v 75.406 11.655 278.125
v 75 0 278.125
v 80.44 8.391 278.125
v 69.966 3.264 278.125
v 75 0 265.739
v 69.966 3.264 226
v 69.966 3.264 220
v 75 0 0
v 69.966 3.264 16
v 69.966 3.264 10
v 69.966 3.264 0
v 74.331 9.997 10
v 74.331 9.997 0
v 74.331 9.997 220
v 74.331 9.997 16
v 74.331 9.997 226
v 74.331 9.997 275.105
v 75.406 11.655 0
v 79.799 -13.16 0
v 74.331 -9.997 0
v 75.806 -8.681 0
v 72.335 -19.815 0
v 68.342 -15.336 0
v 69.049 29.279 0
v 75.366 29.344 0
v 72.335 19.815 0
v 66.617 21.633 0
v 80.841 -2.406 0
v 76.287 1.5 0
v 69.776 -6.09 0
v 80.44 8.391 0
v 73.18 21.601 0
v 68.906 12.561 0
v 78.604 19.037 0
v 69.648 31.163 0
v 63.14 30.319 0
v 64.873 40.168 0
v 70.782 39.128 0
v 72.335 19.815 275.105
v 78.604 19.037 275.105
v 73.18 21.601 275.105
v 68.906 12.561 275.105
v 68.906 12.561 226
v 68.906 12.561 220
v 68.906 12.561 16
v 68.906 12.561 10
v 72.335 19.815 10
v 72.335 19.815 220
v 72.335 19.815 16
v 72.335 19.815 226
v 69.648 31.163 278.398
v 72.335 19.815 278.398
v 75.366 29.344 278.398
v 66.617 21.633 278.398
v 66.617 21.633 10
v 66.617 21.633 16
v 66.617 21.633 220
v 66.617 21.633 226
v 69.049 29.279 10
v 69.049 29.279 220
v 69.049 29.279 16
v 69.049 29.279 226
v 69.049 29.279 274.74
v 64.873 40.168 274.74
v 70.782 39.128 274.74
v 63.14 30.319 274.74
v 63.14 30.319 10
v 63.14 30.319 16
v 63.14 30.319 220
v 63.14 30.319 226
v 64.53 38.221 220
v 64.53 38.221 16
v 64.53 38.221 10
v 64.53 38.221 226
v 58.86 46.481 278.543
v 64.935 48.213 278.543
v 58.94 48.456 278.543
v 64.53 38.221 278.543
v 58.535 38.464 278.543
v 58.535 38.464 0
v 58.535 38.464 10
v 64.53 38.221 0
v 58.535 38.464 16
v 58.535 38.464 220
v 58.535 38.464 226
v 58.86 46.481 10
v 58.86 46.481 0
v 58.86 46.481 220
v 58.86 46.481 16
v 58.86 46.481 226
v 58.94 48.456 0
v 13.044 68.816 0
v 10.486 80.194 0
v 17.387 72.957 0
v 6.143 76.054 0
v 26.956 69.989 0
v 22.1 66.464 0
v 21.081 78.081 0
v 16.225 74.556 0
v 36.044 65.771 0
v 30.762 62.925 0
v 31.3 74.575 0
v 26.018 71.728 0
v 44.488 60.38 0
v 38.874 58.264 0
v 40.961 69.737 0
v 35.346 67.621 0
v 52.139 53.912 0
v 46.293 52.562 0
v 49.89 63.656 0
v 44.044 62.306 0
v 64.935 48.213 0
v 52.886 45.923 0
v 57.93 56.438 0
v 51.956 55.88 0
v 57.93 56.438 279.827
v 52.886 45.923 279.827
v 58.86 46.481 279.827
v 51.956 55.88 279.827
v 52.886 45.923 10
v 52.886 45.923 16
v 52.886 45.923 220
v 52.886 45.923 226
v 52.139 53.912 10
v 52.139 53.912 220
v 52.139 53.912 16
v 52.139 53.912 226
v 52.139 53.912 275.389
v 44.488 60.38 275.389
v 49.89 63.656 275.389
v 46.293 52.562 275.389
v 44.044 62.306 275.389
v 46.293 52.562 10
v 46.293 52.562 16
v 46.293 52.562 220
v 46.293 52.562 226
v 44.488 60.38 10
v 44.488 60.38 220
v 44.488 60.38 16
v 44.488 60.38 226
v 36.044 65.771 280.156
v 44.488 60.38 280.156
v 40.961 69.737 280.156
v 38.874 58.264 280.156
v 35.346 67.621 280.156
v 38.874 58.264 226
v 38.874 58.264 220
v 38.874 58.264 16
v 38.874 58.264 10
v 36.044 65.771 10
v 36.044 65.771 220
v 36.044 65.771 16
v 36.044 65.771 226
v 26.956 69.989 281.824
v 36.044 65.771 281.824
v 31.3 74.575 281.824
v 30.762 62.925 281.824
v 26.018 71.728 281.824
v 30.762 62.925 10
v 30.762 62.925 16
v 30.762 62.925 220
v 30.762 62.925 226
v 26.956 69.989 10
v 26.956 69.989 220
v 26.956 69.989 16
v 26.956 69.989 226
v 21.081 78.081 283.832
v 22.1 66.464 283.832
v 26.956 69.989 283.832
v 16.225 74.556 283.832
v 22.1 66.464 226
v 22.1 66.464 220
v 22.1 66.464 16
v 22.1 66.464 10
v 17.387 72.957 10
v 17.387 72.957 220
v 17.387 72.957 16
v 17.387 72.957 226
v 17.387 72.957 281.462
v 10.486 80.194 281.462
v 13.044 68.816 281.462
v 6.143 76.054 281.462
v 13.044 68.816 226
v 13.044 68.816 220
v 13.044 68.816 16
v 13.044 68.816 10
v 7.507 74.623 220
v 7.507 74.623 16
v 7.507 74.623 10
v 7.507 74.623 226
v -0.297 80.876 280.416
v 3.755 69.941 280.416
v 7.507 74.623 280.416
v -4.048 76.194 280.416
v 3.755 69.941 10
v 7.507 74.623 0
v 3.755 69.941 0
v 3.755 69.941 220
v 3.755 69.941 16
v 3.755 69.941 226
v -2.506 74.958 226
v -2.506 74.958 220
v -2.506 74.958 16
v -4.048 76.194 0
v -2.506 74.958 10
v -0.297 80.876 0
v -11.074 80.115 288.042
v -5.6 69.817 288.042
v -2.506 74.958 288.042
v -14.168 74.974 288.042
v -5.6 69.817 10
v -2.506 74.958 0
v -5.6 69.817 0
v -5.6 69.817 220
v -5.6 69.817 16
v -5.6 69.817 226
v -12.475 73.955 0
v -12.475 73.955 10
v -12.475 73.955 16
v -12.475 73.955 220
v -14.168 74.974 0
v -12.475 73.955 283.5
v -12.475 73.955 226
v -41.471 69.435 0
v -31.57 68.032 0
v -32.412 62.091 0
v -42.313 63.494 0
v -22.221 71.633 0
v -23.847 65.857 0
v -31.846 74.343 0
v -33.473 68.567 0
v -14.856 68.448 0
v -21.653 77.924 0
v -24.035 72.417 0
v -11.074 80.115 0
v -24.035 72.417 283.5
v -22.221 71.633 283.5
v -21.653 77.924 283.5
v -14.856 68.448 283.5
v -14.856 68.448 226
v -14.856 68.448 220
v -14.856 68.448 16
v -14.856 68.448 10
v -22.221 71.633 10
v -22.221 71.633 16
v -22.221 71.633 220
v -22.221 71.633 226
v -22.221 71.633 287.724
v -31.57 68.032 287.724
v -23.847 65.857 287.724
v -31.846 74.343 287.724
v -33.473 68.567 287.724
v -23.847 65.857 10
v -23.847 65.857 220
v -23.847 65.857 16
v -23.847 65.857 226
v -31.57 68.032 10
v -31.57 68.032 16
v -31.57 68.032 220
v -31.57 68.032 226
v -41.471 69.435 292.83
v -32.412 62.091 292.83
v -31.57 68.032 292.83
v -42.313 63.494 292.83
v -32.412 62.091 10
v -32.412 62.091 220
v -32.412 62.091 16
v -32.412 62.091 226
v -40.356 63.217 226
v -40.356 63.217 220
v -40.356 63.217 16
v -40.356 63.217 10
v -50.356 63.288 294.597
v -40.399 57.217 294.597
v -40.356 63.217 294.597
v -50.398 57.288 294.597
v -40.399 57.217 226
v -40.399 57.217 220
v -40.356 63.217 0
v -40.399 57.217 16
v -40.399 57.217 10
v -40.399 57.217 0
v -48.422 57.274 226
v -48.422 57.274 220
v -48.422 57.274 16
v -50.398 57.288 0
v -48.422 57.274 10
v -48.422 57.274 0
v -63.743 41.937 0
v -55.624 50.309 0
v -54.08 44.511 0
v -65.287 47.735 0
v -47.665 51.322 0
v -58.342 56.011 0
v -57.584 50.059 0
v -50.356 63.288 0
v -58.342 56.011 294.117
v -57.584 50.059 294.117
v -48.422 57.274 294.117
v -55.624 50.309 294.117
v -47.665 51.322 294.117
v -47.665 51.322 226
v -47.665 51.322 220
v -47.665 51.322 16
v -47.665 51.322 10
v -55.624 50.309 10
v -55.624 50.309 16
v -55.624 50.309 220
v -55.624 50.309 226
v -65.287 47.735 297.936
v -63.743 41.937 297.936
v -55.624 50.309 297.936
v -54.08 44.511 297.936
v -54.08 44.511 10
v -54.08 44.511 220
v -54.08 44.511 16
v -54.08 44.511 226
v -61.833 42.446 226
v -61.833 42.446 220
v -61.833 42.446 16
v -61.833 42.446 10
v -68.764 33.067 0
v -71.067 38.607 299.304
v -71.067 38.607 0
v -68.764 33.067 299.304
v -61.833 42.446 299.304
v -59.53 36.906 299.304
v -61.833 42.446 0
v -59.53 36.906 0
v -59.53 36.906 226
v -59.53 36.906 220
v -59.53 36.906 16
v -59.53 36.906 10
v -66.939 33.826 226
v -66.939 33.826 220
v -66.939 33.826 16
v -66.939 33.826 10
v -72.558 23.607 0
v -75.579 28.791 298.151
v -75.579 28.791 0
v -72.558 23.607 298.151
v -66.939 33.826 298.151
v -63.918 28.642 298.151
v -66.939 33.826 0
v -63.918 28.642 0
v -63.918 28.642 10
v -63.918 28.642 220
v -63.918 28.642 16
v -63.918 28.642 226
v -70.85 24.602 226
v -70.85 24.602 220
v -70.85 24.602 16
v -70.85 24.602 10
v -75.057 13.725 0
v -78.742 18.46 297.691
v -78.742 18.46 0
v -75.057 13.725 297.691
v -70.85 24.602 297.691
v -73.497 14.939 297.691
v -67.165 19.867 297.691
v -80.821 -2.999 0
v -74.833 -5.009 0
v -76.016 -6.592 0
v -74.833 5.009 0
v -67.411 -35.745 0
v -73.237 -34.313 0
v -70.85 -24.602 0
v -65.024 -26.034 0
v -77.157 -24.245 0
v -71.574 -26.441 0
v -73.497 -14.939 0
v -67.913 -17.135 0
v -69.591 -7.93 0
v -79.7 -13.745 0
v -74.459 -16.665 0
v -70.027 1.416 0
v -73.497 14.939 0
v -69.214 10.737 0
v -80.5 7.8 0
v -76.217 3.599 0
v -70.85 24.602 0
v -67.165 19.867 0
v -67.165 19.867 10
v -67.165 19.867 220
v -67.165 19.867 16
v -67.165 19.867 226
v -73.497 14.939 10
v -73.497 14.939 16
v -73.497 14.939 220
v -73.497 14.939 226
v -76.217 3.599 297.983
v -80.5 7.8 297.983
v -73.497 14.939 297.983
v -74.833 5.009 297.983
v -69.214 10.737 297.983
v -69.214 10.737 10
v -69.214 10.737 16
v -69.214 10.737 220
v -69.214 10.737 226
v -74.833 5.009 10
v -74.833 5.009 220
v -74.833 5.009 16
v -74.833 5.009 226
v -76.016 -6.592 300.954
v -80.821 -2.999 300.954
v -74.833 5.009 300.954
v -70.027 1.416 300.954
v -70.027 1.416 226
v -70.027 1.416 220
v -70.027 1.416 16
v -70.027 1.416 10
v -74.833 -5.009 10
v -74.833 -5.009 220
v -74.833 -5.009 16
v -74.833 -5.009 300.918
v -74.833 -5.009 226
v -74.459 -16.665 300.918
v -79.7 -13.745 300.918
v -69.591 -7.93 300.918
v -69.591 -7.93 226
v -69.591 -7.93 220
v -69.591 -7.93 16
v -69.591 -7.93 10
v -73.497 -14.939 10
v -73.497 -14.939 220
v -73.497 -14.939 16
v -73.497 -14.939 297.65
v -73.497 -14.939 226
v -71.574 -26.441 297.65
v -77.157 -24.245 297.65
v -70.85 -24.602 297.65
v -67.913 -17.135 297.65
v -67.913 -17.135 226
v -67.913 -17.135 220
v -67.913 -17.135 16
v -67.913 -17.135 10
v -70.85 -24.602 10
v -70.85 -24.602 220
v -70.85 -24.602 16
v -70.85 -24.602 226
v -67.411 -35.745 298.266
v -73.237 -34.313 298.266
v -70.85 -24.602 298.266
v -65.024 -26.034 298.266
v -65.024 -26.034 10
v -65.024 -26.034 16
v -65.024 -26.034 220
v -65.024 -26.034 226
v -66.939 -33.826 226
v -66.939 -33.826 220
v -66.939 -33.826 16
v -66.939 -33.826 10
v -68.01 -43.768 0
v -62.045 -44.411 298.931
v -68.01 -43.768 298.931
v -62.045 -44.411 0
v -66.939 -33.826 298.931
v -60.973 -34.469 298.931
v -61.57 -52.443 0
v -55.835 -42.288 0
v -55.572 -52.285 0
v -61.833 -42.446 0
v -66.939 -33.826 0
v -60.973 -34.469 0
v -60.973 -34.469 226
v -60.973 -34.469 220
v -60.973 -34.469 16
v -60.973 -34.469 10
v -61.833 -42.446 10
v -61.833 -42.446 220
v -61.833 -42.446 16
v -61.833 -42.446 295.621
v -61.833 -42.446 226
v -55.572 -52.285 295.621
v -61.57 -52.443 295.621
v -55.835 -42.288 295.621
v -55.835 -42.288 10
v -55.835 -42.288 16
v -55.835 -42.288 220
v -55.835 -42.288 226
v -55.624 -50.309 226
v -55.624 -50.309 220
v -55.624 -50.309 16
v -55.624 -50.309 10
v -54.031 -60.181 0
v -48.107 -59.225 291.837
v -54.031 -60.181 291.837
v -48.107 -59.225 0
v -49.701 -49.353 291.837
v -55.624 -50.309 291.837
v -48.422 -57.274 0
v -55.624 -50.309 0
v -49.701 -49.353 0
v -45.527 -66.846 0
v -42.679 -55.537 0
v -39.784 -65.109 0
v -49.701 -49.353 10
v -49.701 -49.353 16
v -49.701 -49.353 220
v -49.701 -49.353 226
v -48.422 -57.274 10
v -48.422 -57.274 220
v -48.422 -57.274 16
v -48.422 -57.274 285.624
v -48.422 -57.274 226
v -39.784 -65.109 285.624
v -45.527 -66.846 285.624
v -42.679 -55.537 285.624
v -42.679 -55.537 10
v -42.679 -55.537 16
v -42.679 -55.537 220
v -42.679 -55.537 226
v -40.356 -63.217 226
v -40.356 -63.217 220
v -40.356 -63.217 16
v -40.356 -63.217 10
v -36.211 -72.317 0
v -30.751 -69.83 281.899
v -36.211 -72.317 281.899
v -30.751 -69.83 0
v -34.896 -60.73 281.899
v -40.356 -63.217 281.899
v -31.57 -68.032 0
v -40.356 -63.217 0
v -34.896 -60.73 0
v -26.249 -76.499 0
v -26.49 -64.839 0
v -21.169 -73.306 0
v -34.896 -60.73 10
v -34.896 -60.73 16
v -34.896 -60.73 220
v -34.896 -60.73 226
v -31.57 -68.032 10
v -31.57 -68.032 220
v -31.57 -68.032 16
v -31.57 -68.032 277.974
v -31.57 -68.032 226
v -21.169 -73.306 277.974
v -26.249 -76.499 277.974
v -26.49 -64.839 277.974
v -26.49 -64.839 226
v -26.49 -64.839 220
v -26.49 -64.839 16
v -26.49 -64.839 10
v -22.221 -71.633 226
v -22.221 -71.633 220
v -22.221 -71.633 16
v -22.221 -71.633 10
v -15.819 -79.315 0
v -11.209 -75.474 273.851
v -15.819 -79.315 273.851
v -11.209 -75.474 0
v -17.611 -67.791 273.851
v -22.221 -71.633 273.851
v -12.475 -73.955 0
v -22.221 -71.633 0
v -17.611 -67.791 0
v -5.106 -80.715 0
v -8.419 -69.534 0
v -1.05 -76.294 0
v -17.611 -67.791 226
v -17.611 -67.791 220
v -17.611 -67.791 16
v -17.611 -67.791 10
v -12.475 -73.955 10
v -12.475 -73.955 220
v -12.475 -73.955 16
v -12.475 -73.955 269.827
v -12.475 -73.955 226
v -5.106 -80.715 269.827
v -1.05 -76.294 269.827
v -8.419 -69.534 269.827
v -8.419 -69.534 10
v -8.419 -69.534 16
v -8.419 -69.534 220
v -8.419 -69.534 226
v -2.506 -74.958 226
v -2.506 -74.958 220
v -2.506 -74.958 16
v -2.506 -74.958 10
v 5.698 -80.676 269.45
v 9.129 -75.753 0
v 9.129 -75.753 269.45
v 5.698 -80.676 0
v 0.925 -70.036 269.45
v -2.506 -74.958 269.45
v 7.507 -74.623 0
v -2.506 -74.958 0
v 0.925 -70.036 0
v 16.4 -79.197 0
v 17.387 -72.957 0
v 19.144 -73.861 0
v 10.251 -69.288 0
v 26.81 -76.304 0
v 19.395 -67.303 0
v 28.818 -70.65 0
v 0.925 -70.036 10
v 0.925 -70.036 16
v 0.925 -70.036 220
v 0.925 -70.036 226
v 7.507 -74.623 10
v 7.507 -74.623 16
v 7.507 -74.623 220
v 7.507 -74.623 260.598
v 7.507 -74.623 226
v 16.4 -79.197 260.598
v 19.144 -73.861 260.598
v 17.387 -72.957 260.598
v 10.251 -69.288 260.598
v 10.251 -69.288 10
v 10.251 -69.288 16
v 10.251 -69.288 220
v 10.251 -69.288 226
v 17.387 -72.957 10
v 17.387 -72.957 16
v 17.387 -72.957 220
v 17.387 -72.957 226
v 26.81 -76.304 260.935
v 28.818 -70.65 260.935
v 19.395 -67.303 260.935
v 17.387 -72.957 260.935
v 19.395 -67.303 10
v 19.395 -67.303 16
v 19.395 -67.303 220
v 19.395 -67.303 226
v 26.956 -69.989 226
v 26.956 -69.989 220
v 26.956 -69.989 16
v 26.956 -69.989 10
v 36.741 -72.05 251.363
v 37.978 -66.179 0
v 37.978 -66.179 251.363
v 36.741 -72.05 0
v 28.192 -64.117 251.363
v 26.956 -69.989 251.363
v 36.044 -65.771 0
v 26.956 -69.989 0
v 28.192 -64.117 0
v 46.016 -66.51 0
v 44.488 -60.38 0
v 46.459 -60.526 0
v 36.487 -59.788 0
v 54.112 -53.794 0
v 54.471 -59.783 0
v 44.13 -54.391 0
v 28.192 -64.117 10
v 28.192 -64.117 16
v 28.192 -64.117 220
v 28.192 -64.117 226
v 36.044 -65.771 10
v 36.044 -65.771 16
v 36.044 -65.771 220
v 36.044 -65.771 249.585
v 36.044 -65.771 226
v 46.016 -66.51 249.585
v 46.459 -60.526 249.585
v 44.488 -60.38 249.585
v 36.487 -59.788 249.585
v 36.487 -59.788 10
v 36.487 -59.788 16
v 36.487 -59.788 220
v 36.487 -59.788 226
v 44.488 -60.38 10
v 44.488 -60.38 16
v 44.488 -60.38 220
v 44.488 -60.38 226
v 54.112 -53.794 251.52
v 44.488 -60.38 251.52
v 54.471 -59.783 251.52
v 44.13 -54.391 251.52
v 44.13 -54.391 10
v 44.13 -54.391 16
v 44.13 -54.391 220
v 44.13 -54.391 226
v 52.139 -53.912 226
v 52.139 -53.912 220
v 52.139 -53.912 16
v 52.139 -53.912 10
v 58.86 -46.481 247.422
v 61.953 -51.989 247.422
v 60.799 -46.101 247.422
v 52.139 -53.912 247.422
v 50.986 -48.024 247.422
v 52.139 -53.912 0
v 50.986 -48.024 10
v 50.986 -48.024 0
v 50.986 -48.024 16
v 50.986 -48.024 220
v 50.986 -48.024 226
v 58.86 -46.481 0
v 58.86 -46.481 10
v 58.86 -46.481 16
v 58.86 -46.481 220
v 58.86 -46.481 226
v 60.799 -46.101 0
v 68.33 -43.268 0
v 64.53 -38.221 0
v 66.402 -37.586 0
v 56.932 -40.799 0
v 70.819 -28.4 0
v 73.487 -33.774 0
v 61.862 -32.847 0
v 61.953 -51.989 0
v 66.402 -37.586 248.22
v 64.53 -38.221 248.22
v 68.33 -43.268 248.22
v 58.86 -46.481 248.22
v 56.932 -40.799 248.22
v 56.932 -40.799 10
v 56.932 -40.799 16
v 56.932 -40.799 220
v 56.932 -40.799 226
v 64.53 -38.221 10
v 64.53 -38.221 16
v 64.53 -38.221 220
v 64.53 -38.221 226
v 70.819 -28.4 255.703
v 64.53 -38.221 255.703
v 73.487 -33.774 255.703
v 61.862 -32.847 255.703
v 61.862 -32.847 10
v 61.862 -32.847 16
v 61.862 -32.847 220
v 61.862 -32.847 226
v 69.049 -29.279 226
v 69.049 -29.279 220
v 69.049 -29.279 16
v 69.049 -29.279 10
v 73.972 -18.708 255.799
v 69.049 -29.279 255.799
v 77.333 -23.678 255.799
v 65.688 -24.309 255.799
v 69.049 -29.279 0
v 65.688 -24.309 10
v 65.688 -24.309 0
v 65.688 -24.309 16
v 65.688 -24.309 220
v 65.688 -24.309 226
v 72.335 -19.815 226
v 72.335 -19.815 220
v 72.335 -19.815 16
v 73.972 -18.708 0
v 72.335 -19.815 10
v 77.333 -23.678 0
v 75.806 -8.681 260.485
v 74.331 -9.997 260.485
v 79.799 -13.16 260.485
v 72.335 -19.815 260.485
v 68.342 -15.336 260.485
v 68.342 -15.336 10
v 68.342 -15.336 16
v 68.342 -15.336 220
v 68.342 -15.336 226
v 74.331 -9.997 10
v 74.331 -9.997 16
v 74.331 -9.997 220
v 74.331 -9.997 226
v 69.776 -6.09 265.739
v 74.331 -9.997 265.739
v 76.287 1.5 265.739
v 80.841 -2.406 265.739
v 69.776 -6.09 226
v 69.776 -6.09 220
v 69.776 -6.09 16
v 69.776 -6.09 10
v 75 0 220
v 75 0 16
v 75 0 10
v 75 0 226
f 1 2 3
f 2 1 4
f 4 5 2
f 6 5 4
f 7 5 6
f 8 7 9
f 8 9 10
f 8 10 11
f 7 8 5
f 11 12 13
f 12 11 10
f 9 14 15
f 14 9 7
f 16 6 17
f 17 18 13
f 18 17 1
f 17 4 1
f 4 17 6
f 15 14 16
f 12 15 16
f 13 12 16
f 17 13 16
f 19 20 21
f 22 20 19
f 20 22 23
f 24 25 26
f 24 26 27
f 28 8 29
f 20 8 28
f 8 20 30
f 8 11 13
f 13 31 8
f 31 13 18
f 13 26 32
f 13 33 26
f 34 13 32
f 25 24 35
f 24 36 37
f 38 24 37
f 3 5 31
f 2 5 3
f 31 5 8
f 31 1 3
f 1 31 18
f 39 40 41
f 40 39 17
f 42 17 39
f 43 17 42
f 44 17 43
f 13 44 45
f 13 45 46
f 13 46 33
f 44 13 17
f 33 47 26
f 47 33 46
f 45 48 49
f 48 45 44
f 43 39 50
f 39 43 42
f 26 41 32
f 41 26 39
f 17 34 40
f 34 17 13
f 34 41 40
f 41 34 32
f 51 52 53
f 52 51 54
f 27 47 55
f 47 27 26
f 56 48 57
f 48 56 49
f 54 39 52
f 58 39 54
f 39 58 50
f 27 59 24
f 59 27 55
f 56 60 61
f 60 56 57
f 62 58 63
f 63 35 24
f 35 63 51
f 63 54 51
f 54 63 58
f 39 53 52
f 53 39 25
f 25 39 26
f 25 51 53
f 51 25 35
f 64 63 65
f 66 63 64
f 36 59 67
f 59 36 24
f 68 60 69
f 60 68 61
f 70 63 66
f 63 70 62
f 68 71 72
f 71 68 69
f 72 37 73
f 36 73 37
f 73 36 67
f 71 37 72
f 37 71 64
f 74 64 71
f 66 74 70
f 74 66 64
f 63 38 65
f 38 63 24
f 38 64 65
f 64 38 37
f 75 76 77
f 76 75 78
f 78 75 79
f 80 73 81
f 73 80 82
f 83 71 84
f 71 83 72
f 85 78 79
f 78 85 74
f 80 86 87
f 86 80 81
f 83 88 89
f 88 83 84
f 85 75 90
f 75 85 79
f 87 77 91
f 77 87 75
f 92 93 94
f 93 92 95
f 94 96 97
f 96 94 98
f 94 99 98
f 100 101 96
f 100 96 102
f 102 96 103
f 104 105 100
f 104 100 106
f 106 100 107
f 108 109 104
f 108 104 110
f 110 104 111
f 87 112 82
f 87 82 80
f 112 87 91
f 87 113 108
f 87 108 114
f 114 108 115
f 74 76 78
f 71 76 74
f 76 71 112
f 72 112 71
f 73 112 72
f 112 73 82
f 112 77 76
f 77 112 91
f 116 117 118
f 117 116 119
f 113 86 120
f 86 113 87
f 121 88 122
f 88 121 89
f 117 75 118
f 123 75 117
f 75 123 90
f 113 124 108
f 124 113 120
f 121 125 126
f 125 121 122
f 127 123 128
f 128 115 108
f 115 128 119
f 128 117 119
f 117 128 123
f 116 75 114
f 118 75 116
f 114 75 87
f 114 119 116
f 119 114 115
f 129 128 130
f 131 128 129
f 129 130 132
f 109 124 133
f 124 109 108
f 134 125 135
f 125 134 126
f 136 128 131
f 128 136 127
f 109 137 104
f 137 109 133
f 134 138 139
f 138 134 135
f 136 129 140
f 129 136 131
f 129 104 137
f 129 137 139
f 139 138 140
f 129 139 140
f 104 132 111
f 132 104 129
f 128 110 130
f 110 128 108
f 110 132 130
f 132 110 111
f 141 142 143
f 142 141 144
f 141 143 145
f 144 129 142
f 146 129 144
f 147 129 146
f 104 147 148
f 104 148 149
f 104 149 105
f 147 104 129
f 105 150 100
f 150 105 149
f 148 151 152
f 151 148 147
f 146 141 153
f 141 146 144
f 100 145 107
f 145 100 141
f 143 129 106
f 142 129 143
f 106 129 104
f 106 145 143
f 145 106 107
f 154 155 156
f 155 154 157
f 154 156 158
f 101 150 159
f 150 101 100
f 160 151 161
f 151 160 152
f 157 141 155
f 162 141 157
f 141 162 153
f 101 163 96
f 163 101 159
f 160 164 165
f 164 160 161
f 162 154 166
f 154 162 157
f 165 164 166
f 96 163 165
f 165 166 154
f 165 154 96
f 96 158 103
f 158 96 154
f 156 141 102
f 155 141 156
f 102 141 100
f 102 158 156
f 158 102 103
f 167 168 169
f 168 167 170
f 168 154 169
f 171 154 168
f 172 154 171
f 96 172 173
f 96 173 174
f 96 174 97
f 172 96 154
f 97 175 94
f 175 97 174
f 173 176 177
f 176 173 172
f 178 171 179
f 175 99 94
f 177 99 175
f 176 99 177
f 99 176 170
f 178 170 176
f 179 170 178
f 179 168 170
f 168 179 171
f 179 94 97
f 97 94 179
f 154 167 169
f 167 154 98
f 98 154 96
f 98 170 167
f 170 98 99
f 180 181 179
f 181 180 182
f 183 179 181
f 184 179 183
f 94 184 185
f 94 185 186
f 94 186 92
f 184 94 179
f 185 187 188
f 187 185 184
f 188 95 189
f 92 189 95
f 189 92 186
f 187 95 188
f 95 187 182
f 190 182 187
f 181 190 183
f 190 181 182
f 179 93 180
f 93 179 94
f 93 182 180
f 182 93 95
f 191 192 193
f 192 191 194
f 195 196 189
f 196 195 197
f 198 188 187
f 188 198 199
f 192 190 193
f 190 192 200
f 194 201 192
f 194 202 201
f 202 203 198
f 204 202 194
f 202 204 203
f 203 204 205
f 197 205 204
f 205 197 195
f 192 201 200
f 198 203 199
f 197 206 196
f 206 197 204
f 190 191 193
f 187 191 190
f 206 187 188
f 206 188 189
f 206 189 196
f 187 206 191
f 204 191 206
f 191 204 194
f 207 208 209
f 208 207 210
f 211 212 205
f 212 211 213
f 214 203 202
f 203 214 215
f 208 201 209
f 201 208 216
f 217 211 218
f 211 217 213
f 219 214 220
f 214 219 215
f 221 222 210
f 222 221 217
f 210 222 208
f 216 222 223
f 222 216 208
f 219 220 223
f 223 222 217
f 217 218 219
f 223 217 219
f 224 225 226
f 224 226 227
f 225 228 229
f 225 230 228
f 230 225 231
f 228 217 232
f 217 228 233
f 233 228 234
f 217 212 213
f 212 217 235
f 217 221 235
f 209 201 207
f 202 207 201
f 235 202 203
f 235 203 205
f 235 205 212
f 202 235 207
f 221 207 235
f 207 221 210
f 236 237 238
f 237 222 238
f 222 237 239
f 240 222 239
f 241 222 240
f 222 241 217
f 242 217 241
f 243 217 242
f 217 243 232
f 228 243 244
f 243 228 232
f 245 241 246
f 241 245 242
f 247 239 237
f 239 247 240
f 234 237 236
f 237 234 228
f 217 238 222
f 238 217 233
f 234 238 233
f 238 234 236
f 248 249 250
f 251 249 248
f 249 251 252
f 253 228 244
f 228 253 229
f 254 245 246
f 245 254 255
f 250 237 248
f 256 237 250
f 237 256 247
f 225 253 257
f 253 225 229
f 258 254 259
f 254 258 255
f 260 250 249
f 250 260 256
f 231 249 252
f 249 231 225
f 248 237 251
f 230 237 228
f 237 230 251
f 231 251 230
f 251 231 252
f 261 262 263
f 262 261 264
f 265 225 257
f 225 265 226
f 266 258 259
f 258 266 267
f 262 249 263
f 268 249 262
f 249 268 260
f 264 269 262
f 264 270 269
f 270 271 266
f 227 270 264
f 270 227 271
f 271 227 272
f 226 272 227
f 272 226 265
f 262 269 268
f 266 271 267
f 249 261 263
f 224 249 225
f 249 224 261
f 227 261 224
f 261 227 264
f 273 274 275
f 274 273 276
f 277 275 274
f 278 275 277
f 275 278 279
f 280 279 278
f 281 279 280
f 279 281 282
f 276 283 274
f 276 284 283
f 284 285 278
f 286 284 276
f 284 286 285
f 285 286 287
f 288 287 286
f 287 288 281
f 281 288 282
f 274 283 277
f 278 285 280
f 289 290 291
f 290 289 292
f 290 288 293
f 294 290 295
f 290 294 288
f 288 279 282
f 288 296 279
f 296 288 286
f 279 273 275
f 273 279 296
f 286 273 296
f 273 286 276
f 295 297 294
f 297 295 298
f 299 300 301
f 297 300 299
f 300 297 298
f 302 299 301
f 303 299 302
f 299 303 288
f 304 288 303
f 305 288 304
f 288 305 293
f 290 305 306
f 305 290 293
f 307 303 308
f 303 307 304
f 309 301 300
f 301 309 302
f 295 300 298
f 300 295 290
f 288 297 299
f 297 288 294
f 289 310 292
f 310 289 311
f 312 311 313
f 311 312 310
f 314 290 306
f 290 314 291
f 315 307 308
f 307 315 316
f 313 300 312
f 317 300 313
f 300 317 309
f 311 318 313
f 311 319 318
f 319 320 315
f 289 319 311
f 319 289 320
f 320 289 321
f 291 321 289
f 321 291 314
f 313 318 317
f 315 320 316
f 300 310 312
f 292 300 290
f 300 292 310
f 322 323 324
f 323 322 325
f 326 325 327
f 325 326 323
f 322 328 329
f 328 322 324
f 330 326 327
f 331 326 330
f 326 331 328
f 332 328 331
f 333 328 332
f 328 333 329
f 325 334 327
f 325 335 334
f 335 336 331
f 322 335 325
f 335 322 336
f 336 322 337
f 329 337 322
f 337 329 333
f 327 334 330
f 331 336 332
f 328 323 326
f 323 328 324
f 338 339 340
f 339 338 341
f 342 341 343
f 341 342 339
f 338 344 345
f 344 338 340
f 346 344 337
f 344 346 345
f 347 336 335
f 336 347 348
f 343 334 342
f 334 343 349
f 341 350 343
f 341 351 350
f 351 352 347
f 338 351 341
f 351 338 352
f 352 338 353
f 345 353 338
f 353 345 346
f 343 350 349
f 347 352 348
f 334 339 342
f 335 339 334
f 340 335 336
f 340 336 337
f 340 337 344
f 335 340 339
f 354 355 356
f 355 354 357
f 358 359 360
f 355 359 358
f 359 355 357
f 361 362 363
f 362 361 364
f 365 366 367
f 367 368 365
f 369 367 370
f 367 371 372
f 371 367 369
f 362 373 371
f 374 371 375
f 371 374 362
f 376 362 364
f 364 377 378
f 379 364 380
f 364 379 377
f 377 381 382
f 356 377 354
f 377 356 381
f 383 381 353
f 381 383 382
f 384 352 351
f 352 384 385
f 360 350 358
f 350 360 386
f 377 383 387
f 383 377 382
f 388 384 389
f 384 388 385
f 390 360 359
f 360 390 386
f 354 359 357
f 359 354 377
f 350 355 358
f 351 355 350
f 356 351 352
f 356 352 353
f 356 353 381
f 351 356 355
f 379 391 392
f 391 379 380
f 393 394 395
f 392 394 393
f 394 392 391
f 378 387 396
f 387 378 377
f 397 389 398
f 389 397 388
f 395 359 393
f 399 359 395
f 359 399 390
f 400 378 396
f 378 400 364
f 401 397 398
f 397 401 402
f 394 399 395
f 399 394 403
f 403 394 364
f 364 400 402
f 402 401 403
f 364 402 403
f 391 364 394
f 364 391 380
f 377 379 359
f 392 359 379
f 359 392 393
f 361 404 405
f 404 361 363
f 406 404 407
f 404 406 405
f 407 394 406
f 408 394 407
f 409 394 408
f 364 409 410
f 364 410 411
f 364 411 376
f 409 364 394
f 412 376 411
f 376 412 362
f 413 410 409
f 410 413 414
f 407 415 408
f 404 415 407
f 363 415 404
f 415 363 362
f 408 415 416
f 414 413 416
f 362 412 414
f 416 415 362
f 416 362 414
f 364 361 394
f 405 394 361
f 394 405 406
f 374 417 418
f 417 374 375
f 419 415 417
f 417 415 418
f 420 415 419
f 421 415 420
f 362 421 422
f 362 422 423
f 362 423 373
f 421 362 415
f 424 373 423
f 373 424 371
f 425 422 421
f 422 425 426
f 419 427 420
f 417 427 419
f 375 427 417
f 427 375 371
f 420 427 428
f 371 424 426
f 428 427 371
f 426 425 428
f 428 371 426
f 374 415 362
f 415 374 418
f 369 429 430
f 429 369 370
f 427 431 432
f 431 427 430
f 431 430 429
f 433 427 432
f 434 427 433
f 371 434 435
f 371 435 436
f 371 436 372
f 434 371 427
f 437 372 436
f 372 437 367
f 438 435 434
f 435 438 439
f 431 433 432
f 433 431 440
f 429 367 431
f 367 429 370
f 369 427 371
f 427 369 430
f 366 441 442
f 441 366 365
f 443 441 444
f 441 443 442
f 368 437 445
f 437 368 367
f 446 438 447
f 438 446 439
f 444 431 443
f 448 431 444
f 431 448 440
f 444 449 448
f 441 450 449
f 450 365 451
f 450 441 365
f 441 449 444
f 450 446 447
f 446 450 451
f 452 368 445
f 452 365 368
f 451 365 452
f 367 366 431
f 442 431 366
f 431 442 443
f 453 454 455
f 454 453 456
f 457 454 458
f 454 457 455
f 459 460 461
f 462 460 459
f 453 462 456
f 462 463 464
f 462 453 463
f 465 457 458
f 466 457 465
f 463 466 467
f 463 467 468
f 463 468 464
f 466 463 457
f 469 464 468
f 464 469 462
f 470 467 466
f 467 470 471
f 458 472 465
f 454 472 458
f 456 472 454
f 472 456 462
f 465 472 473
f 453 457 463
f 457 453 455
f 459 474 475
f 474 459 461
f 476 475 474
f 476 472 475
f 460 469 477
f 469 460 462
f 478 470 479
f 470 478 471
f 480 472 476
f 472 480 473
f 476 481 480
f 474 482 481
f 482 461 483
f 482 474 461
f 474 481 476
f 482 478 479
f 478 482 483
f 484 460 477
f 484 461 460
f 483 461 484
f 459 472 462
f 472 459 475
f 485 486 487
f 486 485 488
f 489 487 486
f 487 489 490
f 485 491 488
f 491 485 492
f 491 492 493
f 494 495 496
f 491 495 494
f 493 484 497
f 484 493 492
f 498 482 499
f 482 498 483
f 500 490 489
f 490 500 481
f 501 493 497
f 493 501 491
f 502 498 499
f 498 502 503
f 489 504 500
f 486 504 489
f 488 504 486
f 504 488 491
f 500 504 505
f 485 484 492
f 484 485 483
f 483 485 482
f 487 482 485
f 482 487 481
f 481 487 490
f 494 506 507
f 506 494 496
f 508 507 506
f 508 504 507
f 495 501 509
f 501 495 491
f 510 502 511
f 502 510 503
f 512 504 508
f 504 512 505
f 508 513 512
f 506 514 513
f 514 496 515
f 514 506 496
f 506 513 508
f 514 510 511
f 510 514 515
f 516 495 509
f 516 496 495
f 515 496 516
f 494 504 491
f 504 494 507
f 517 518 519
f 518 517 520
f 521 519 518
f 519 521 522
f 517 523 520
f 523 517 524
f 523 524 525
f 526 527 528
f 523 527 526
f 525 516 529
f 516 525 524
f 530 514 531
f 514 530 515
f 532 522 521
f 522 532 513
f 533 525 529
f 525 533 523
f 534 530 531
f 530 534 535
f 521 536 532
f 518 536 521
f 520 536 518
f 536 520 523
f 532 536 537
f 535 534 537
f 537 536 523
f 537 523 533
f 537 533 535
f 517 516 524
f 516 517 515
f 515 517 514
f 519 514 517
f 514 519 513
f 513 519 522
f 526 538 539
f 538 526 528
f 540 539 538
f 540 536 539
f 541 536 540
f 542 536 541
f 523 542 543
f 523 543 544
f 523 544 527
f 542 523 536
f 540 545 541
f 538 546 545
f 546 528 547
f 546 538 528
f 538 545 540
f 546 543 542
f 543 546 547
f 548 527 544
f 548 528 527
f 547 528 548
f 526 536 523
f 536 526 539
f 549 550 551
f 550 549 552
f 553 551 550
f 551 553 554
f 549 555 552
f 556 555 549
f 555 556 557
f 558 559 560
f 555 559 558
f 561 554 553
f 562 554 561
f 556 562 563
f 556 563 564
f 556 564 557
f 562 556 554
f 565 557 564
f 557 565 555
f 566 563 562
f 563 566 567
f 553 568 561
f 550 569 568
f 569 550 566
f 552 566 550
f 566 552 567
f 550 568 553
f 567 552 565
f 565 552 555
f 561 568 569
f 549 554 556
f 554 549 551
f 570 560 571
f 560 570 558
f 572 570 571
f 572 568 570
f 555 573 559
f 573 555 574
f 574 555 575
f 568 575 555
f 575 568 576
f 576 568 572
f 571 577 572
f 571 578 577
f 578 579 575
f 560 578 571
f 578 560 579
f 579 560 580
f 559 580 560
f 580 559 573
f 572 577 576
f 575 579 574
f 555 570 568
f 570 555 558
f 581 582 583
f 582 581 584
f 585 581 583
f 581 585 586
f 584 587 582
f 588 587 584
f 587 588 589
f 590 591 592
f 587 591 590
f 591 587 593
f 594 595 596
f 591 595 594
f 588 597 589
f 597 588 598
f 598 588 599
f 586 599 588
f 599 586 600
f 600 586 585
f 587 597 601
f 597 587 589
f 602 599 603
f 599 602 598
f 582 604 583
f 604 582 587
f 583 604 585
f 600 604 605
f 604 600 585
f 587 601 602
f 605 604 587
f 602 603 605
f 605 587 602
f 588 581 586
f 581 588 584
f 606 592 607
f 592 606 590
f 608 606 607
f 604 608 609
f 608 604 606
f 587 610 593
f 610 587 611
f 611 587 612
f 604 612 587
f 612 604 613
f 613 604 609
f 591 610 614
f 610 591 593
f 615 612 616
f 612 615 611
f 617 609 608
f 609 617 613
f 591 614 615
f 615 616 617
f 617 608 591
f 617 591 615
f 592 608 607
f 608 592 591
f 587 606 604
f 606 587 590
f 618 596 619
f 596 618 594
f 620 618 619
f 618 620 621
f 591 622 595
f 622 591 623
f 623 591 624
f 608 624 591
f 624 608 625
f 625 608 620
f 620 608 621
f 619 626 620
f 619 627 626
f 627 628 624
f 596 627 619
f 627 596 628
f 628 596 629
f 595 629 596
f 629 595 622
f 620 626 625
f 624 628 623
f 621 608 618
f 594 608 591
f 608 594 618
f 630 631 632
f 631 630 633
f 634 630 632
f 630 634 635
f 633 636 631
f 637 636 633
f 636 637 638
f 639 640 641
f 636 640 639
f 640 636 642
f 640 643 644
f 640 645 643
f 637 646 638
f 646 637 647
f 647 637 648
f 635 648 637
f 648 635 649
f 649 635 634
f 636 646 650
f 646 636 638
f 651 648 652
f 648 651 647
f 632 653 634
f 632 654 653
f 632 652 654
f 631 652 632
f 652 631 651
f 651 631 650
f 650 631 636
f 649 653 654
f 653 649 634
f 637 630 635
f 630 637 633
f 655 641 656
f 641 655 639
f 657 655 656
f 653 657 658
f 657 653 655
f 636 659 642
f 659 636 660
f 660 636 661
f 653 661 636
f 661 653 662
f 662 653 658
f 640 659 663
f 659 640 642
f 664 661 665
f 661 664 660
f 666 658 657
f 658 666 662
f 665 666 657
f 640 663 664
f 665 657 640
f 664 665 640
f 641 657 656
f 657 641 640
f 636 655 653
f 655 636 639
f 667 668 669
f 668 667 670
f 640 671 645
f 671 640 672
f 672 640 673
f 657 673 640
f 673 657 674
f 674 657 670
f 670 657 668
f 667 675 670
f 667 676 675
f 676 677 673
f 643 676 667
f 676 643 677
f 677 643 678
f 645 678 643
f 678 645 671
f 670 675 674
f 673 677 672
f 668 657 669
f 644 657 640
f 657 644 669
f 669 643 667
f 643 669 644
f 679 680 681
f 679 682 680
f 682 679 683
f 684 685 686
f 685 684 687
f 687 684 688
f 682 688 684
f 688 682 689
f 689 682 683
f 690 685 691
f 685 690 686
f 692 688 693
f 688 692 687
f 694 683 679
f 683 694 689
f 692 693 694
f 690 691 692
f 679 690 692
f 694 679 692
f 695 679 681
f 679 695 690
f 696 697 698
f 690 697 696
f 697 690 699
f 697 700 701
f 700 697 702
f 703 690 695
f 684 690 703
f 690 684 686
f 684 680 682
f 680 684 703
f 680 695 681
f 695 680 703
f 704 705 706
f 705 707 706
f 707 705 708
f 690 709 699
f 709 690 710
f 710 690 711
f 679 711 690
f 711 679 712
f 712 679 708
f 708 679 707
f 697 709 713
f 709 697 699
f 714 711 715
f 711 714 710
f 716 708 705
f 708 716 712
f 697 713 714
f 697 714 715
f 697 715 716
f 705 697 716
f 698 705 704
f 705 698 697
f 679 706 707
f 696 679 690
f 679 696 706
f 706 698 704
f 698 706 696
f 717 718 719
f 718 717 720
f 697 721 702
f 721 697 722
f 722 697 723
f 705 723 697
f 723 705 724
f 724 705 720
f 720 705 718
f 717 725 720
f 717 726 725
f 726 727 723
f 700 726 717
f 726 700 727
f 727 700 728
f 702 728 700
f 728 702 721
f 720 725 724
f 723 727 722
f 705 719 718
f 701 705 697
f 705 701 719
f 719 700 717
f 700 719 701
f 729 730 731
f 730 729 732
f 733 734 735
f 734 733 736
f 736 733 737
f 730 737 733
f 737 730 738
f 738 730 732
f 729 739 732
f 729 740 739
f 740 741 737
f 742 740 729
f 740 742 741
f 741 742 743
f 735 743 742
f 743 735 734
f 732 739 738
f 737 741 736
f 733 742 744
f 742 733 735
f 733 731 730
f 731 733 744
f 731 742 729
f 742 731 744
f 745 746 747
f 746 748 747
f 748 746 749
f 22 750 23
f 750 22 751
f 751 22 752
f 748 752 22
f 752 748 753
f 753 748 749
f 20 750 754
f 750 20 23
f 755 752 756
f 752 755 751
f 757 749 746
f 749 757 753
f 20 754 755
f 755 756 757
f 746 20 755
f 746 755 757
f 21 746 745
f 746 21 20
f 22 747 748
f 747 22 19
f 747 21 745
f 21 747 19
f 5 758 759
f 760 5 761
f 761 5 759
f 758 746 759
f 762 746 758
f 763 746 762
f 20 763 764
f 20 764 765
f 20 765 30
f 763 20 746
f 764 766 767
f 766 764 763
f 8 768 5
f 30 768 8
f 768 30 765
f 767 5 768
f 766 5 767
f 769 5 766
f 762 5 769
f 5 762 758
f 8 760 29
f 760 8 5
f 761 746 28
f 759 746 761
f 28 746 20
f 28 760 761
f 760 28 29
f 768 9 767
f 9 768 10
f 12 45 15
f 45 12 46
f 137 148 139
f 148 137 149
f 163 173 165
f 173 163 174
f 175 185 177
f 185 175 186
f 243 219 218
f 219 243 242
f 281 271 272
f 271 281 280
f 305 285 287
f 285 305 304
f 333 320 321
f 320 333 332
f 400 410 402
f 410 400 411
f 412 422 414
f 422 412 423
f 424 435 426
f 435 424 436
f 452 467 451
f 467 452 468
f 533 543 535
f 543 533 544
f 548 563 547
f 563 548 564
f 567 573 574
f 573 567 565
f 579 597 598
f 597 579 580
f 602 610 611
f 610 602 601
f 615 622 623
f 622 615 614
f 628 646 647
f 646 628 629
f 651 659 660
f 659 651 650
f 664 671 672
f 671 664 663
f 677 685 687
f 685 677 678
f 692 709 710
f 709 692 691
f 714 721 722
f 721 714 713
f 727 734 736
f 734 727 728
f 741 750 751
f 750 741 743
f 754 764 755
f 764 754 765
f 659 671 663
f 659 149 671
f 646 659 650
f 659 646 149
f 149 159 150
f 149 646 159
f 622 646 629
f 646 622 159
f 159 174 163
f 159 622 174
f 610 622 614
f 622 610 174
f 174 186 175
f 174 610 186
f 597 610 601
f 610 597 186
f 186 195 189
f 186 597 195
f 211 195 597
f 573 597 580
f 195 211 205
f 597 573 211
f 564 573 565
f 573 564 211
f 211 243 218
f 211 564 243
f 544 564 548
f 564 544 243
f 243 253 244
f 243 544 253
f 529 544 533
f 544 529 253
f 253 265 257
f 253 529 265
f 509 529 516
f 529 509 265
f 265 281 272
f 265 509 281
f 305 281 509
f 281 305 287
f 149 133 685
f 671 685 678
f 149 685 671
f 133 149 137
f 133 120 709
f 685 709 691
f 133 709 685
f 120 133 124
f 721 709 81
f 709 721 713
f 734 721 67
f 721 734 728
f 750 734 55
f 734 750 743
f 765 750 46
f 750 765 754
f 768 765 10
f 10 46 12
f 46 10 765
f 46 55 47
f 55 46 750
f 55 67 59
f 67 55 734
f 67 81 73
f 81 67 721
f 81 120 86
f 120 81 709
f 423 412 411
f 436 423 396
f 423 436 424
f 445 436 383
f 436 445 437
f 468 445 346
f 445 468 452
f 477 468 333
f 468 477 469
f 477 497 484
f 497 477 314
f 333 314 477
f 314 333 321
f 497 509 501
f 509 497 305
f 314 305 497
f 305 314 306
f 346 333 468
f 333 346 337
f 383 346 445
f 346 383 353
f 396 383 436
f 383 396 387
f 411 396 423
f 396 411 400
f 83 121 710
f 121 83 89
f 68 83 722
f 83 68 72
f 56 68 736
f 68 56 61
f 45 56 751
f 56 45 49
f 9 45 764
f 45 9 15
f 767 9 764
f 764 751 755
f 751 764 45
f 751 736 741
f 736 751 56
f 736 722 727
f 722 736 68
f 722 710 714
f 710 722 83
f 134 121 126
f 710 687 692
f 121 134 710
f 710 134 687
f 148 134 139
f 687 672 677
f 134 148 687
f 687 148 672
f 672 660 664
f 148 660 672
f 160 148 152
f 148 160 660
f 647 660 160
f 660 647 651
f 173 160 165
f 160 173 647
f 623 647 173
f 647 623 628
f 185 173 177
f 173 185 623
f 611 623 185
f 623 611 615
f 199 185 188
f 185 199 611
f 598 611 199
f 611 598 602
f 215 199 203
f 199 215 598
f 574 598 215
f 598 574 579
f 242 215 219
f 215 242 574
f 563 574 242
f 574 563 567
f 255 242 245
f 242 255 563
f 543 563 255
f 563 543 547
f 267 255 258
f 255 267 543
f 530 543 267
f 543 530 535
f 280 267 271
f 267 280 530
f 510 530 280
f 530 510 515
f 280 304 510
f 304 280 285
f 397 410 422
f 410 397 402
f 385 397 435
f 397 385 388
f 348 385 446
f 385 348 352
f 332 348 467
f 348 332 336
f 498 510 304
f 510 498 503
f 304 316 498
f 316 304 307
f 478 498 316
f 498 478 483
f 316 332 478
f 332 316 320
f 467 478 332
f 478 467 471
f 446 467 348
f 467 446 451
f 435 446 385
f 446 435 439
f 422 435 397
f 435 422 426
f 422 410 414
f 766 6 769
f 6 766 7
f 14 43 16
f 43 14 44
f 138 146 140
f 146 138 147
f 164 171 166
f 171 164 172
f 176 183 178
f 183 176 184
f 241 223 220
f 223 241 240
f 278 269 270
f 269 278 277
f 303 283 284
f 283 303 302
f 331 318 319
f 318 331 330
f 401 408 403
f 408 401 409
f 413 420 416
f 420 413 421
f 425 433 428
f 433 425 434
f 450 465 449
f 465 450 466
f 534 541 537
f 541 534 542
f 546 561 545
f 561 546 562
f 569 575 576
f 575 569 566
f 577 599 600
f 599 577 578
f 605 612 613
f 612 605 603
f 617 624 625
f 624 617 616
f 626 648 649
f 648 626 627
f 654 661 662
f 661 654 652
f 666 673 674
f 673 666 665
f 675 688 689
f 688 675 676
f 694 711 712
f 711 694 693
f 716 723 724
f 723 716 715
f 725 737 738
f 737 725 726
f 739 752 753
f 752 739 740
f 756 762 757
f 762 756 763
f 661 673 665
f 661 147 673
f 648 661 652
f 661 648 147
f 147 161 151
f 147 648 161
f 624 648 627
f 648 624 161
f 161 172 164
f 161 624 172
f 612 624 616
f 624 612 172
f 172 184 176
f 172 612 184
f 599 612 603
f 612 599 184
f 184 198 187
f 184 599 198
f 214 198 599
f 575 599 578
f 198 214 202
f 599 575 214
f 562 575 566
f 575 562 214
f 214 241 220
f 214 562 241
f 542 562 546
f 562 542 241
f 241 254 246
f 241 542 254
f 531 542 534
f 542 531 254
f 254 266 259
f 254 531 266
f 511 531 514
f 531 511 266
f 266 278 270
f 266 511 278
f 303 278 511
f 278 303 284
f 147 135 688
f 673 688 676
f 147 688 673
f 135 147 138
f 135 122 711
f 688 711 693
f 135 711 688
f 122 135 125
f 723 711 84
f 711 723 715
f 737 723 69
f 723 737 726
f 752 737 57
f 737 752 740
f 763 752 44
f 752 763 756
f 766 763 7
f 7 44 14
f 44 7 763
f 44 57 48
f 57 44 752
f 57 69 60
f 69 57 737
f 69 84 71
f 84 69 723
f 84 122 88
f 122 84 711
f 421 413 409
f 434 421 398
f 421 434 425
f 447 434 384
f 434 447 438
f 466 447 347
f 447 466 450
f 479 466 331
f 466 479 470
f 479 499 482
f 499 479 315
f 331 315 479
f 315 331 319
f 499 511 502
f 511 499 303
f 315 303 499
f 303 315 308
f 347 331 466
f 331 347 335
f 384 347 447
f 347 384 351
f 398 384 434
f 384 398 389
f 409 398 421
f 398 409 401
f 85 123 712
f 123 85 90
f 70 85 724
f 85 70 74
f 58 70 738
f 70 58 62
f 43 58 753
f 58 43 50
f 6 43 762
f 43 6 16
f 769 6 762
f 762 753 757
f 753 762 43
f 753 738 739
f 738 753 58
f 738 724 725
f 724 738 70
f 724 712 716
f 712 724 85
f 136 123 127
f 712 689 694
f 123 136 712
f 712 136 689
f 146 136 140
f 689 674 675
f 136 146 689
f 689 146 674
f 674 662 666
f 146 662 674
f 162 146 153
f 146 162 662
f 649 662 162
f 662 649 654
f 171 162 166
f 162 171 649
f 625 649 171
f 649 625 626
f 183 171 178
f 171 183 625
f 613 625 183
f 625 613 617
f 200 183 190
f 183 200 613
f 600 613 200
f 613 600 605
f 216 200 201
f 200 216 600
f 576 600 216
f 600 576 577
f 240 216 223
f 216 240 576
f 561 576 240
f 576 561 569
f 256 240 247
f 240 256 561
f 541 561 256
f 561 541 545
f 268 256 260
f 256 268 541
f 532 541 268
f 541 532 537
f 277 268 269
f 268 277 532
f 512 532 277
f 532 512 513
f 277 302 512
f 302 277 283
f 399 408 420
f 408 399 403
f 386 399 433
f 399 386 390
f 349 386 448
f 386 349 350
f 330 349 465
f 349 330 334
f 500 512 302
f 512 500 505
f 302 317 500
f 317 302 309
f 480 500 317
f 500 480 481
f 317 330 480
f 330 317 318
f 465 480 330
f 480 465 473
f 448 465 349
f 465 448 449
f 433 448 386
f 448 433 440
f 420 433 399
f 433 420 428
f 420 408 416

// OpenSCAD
$fn=100;

t_height = 300;
t_dia = 150;

thickness = 6;

length = 10;


// get the number of elements by filling the circumference
elements = floor((t_dia * PI) / (thickness + 4));



R = t_dia / 2;
h = thickness;
x = cos(360/elements) * R;
y = sin(360/elements) * R;
// Now for some "magic":
v = 2 * atan((sqrt(-h*h + R*R - 2*R*x + x*x + y*y) + R - x) / (h + y));
// This is the solution of finding the angle v when intersecting the line
// tan(v)(x - R - h / sin(v))
// with the point [cos(gamma)*R, sin(gamma)*R]
// which is the solution to the problem of requiring that the "fins"
// do touch each other

echo(R, h, x, y);
echo(v);




echo(elements);

module fins() {
    color("green", 0.25)
    for ( i = [0:(360 / elements):360] ) {
        rotate([0,0,i]) translate([t_dia/2, 0, 0]) rotate([0,0,v]) cube([length, thickness, t_height-25 + 25 * (sin((i*i)/(360)) + 1/8*cos(i*i*i))]);
    };
}

module fins_d() {
    color("green", 0.25)
    for ( i = [0:(360 / elements):360] ) {
        rotate([0,0,i]) translate([t_dia/2, 0, 0]) rotate([0,0,v]) translate([0,-10,0]) cube([length, thickness+10, t_height-25 + 25 * (sin((i*i)/(360)) + 1/8*cos(i*i*i))]);
    };
}


module plate(){
    difference(){
    cylinder(h=thickness, r=t_dia/2 + thickness/2);
    translate([0,0,-10]) fins_d();
    }
}

fins();

translate([0, 0, 10]) plate();


translate([0, 0, t_height - 80]) plate();
